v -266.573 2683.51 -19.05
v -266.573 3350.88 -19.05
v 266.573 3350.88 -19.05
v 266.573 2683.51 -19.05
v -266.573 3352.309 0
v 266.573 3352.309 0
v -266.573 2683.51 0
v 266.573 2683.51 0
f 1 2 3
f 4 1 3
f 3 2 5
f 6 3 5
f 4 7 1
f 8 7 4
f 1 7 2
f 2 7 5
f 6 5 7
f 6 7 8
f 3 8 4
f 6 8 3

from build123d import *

# Parameters (mm, degrees)
SKETCH1_W           = 533.146
SKETCH1_H           = 668.799499747
BOSS_EXTRUDE1_DEPTH = 19.05
CUT_EXTRUDE1_DEPTH  = 3395.493561919


with BuildPart() as part:
    # Sketch1 → Boss-Extrude1 (new body)
    with BuildSketch(Plane.XY):
        with Locations((0, 3017.909749874)):
            Rectangle(SKETCH1_W, SKETCH1_H)
    extrude(amount=-BOSS_EXTRUDE1_DEPTH)

    # Sketch2 → Cut-Extrude1 (cut, through all)
    with BuildSketch(Plane.ZY.offset(266.573)):
        Polygon((-2.286e-06, 3352.309499747), (-1.425493043, 3371.306090918), (-106.894117253, 3363.3918), (-114.853775761, 3343.690953871), align=None)
    extrude(amount=-CUT_EXTRUDE1_DEPTH, mode=Mode.SUBTRACT)


solid = part.part
